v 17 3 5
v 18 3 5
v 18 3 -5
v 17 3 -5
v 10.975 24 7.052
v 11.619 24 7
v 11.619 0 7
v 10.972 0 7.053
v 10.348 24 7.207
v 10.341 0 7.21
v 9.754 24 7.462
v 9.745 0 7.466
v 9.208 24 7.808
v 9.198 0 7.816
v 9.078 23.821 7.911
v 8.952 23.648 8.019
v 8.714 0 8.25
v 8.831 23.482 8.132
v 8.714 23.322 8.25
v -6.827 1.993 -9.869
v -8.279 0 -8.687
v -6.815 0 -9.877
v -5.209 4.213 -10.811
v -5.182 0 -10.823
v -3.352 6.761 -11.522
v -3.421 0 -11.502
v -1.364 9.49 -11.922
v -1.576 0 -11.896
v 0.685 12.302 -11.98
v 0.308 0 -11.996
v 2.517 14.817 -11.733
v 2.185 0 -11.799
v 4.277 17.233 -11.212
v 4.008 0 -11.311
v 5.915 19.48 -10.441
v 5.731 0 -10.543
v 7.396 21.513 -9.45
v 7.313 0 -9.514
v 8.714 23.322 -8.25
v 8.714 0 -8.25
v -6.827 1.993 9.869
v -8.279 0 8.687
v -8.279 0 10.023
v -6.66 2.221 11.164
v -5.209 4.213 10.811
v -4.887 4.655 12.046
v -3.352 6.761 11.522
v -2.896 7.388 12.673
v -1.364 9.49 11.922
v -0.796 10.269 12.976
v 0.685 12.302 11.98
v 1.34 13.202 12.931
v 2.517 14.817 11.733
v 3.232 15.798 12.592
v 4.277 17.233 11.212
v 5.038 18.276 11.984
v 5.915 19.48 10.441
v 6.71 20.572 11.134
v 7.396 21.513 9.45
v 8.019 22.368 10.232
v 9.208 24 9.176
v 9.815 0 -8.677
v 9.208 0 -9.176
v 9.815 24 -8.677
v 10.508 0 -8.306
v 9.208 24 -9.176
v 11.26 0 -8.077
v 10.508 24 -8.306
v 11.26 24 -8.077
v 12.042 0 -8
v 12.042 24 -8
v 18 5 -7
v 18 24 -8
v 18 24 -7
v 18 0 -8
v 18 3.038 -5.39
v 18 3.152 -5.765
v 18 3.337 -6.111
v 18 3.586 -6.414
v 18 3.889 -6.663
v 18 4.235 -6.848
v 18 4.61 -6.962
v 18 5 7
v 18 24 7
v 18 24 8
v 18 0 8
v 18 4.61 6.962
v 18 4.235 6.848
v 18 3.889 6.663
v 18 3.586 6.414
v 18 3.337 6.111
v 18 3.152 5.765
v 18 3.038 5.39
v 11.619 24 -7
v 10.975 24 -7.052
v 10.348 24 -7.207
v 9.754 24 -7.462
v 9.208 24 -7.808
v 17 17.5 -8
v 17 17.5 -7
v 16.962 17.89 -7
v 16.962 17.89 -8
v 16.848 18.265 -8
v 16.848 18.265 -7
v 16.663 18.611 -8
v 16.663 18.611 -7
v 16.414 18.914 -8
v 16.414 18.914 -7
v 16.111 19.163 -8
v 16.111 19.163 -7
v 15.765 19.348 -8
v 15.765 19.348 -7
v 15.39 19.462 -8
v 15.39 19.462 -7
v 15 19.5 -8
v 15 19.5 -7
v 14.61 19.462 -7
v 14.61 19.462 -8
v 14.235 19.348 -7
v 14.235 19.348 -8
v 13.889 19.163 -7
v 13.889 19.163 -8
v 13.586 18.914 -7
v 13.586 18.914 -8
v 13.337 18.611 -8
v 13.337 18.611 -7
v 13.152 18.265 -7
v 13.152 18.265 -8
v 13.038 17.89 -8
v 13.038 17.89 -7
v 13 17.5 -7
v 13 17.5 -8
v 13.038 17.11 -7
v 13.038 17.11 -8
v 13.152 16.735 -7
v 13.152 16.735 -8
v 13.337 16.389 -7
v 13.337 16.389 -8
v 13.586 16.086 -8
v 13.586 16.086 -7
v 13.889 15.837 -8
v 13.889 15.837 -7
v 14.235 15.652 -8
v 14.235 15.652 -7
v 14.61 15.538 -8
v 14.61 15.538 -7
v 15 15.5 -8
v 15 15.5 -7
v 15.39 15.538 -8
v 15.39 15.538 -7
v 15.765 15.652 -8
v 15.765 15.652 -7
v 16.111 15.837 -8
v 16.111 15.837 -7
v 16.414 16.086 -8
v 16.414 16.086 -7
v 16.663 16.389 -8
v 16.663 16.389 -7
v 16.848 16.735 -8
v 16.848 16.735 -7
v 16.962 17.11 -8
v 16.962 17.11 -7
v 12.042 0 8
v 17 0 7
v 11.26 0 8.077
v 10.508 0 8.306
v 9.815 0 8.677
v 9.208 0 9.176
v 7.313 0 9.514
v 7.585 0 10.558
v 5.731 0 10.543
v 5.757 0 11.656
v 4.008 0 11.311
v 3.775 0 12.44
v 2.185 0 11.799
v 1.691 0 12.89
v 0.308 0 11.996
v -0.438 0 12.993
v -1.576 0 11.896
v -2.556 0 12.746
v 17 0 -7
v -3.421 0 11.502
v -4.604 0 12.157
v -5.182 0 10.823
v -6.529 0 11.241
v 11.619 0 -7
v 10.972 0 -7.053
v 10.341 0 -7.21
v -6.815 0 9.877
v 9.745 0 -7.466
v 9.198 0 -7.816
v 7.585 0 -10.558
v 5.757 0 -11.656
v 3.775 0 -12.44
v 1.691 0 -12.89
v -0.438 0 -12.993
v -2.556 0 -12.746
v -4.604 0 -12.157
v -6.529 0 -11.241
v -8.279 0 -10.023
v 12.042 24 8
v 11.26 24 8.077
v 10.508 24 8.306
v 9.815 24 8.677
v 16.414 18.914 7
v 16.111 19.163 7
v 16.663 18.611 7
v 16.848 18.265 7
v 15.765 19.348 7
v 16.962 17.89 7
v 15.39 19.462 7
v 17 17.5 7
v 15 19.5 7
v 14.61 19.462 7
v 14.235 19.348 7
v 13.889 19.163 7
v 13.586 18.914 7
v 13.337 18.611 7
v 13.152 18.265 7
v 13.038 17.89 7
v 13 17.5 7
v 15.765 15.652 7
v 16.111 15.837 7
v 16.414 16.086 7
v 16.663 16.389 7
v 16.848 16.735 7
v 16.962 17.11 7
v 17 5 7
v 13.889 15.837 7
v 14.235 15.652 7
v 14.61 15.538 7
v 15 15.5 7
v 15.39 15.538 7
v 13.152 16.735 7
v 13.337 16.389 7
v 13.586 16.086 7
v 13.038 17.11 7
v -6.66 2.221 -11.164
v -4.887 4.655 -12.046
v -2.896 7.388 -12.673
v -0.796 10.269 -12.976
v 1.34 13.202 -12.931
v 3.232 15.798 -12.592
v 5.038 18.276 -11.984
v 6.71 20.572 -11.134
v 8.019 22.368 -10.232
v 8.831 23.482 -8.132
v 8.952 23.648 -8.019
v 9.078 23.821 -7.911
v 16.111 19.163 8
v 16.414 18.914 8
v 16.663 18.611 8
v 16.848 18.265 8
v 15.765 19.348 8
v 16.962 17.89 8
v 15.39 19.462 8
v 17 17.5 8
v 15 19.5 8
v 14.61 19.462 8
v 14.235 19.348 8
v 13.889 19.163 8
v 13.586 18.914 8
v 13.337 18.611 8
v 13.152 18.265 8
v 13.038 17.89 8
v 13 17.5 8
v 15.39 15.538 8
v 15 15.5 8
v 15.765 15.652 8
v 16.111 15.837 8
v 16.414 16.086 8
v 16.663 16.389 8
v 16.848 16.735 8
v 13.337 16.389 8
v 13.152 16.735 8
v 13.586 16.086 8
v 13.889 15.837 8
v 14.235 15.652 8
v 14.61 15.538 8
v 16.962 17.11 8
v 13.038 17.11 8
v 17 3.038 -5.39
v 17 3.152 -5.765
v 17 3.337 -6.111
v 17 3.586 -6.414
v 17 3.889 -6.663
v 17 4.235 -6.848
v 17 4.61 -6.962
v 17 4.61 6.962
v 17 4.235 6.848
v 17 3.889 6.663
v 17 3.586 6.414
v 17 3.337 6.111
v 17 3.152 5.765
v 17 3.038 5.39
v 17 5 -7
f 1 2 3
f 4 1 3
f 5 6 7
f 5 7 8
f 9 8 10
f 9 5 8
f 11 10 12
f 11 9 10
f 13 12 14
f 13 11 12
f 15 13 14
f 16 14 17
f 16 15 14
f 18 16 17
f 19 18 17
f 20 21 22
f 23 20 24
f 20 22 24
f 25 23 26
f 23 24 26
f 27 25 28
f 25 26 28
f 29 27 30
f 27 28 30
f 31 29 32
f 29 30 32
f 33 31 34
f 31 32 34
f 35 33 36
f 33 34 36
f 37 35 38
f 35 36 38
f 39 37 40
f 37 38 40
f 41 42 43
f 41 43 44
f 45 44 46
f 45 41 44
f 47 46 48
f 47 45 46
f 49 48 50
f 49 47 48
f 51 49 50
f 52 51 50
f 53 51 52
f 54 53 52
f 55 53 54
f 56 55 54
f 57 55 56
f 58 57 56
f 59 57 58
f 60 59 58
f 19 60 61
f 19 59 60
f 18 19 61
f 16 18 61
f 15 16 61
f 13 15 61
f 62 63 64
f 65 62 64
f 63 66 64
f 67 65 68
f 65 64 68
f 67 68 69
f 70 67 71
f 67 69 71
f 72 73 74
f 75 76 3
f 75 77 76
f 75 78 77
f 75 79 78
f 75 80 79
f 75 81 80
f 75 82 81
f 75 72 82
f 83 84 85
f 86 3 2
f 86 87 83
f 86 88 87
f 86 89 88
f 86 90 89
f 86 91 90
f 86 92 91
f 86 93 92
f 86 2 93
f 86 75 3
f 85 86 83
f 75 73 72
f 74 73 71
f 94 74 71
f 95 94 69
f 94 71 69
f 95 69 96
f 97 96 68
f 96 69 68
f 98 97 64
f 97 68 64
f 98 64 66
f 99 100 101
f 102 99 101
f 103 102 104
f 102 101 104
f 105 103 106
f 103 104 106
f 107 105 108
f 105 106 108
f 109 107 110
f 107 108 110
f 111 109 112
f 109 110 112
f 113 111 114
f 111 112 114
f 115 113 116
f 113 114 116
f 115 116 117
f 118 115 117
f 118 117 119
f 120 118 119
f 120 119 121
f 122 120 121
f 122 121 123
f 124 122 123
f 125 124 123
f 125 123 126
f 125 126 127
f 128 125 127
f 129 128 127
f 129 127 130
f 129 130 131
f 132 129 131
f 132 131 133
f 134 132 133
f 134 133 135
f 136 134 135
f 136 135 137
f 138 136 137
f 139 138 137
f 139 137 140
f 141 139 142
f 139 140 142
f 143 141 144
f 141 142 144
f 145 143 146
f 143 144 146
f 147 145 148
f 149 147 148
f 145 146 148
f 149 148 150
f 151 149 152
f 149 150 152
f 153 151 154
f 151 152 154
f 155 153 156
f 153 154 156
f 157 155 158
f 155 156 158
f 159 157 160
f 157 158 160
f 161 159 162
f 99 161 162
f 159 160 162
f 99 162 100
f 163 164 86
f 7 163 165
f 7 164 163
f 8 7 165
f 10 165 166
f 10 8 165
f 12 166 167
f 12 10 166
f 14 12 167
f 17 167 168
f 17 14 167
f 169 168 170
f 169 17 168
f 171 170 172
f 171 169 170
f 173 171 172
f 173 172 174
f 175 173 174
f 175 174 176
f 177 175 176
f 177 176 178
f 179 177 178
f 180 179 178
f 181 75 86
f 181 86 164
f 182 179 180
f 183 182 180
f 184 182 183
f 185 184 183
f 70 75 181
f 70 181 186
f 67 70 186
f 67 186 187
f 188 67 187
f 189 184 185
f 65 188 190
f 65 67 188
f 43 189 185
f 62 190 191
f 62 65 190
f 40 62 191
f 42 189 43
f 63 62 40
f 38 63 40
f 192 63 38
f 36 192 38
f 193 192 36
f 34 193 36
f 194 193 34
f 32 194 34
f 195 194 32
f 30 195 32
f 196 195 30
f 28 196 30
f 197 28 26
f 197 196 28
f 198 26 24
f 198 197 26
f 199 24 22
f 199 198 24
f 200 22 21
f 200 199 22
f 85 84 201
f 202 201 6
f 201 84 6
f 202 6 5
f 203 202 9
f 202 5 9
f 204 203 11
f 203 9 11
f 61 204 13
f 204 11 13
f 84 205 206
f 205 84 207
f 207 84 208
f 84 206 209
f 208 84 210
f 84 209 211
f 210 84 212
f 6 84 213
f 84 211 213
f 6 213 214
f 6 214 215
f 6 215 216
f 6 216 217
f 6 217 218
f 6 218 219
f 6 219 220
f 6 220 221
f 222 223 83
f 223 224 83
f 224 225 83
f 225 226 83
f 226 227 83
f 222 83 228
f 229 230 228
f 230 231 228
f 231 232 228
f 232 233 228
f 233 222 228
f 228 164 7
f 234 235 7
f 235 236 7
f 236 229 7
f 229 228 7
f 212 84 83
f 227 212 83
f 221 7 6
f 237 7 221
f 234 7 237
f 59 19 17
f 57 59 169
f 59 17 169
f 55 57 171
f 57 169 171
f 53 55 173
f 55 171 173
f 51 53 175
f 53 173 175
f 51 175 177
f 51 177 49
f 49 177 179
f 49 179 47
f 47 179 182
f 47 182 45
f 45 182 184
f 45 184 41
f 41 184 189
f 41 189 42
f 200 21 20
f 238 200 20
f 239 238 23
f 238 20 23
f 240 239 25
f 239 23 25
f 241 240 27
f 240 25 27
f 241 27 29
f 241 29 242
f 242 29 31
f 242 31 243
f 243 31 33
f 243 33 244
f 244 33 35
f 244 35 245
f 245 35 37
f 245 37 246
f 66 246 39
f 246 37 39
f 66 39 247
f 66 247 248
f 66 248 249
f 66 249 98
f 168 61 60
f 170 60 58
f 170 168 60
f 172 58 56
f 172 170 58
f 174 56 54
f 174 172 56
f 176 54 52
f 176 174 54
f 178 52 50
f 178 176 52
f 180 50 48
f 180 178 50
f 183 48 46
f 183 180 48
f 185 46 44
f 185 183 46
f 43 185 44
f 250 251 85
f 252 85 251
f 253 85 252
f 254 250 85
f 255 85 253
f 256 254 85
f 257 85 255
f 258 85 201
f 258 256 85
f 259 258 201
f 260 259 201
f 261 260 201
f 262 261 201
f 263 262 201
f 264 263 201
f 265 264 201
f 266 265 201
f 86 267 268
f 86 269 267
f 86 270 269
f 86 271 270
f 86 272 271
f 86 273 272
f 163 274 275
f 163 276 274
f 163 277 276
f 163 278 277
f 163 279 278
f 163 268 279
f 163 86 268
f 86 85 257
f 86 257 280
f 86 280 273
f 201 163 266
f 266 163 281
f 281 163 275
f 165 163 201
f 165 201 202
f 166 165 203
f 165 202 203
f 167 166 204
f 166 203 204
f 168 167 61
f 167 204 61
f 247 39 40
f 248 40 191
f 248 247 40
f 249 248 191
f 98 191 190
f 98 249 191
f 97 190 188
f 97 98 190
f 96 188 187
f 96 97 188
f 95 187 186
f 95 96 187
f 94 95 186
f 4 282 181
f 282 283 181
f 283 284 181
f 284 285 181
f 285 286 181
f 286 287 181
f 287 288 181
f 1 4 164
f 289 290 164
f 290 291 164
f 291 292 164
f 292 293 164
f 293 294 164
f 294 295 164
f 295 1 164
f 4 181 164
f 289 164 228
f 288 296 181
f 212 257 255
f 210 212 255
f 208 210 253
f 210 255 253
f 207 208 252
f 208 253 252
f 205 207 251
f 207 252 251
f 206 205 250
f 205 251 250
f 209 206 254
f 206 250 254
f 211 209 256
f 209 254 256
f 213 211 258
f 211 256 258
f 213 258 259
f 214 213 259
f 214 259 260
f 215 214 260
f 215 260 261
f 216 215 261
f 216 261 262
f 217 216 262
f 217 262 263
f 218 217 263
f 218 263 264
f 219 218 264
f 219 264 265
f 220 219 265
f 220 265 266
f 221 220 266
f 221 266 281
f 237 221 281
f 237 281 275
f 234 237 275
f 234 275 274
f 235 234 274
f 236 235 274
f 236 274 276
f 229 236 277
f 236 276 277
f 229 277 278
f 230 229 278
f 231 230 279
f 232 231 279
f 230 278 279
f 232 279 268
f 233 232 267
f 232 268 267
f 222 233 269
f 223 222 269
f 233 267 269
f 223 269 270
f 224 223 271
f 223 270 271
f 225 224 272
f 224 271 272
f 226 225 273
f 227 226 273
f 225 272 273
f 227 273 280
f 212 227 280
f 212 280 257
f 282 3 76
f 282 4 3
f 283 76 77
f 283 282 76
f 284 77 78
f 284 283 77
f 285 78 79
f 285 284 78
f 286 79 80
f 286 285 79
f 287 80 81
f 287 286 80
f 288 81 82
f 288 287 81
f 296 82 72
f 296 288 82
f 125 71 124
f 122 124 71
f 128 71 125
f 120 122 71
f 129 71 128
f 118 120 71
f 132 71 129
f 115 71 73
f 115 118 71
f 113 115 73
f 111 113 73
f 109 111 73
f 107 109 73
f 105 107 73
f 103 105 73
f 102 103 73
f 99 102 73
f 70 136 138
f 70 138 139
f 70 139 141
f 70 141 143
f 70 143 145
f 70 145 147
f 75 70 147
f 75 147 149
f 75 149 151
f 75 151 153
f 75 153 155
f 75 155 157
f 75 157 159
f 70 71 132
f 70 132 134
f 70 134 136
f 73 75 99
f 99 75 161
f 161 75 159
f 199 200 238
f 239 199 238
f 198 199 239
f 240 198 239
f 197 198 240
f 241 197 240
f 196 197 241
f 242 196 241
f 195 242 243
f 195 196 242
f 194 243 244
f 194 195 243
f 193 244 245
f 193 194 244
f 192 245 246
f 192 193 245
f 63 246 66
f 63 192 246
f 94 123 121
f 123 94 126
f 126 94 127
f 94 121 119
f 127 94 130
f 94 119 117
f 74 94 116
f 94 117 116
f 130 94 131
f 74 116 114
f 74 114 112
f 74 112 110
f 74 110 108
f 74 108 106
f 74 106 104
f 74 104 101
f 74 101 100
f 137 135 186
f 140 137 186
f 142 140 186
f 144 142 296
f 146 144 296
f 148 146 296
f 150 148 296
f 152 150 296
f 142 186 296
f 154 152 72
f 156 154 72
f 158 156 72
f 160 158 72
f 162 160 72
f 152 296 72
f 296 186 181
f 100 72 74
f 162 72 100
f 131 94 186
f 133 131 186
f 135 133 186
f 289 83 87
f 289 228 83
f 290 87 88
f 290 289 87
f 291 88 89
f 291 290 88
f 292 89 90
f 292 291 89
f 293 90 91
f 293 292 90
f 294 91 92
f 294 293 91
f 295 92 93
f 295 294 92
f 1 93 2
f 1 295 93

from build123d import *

# Parameters (mm, degrees)
BOSS_EXTRUDE1_DEPTH     = 24
FILLET1_R               = 4
CUT_EXTRUDE3_DEPTH      = 14
CUT_EXTRUDE3_DEPTH_BACK = 14
SKETCH5_R               = 2
CUT_EXTRUDE4_DEPTH      = 6
CUT_EXTRUDE4_DEPTH_BACK = 22
SKETCH7_W               = 14
SKETCH7_H               = 22.802557385
CUT_EXTRUDE5_DEPTH      = 1
CUT_EXTRUDE5_DEPTH_BACK = 27.278788925
FILLET2_R               = 2


with BuildPart() as part:
    # Sketch1 → Boss-Extrude1 (new body)
    with BuildSketch(Plane(origin=(0, 0, 0), x_dir=(1, 0, 0), z_dir=(0, 1, 0))):
        with BuildLine():
            Line((18, -8), (10.246950766, -8))
            ThreePointArc((10.246950766, -8), (-13, 0), (10.246950766, 8))
            Line((10.246950766, 8), (18, 8))
            Line((18, 8), (18, -8))
        make_face()
        with BuildLine():
            Line((17, -7), (9.746794345, -7))
            ThreePointArc((9.746794345, -7), (-12, 0), (9.746794345, 7))
            Line((9.746794345, 7), (17, 7))
            Line((17, 7), (17, -7))
        make_face(mode=Mode.SUBTRACT)
    extrude(amount=BOSS_EXTRUDE1_DEPTH)

    # Fillet1
    fillet1_edges = [part.edges().sort_by_distance(p)[0] for p in [
        (9.746794345, 12, -7),
        (9.746794345, 12, 7),
        (10.246950766, 12, 8),
        (10.246950766, 12, -8),
    ]]
    fillet(fillet1_edges, radius=FILLET1_R)

    # Sketch4 → Cut-Extrude3 (cut, two sides)
    with BuildSketch(Plane.XY) as cut_extrude3_sk:
        Polygon((-13, 0), (-8.278788925, 0), (9.208278207, 24), (-13, 24), align=None)
    extrude(amount=CUT_EXTRUDE3_DEPTH, mode=Mode.SUBTRACT)
    extrude(cut_extrude3_sk.sketch, amount=-CUT_EXTRUDE3_DEPTH_BACK, mode=Mode.SUBTRACT)

    # Sketch5 → Cut-Extrude4 (cut, two sides)
    with BuildSketch(Plane.XY.offset(8)) as cut_extrude4_sk:
        with Locations((15, 17.5)):
            Circle(SKETCH5_R)
    extrude(amount=CUT_EXTRUDE4_DEPTH, mode=Mode.SUBTRACT)
    extrude(cut_extrude4_sk.sketch, amount=-CUT_EXTRUDE4_DEPTH_BACK, mode=Mode.SUBTRACT)

    # Sketch7 → Cut-Extrude5 (cut, two sides)
    with BuildSketch(Plane(origin=(18, 0, 0), x_dir=(0, 0, -1), z_dir=(1, 0, 0))) as cut_extrude5_sk:
        with Locations((0, 14.401278693)):
            Rectangle(SKETCH7_W, SKETCH7_H)
    extrude(amount=CUT_EXTRUDE5_DEPTH, mode=Mode.SUBTRACT)
    extrude(cut_extrude5_sk.sketch, amount=-CUT_EXTRUDE5_DEPTH_BACK, mode=Mode.SUBTRACT)

    # Fillet2
    fillet2_edges = [part.edges().sort_by_distance(p)[0] for p in [
        (17.5, 3, -7),
        (17.5, 3, 7),
    ]]
    fillet(fillet2_edges, radius=FILLET2_R)


solid = part.part
